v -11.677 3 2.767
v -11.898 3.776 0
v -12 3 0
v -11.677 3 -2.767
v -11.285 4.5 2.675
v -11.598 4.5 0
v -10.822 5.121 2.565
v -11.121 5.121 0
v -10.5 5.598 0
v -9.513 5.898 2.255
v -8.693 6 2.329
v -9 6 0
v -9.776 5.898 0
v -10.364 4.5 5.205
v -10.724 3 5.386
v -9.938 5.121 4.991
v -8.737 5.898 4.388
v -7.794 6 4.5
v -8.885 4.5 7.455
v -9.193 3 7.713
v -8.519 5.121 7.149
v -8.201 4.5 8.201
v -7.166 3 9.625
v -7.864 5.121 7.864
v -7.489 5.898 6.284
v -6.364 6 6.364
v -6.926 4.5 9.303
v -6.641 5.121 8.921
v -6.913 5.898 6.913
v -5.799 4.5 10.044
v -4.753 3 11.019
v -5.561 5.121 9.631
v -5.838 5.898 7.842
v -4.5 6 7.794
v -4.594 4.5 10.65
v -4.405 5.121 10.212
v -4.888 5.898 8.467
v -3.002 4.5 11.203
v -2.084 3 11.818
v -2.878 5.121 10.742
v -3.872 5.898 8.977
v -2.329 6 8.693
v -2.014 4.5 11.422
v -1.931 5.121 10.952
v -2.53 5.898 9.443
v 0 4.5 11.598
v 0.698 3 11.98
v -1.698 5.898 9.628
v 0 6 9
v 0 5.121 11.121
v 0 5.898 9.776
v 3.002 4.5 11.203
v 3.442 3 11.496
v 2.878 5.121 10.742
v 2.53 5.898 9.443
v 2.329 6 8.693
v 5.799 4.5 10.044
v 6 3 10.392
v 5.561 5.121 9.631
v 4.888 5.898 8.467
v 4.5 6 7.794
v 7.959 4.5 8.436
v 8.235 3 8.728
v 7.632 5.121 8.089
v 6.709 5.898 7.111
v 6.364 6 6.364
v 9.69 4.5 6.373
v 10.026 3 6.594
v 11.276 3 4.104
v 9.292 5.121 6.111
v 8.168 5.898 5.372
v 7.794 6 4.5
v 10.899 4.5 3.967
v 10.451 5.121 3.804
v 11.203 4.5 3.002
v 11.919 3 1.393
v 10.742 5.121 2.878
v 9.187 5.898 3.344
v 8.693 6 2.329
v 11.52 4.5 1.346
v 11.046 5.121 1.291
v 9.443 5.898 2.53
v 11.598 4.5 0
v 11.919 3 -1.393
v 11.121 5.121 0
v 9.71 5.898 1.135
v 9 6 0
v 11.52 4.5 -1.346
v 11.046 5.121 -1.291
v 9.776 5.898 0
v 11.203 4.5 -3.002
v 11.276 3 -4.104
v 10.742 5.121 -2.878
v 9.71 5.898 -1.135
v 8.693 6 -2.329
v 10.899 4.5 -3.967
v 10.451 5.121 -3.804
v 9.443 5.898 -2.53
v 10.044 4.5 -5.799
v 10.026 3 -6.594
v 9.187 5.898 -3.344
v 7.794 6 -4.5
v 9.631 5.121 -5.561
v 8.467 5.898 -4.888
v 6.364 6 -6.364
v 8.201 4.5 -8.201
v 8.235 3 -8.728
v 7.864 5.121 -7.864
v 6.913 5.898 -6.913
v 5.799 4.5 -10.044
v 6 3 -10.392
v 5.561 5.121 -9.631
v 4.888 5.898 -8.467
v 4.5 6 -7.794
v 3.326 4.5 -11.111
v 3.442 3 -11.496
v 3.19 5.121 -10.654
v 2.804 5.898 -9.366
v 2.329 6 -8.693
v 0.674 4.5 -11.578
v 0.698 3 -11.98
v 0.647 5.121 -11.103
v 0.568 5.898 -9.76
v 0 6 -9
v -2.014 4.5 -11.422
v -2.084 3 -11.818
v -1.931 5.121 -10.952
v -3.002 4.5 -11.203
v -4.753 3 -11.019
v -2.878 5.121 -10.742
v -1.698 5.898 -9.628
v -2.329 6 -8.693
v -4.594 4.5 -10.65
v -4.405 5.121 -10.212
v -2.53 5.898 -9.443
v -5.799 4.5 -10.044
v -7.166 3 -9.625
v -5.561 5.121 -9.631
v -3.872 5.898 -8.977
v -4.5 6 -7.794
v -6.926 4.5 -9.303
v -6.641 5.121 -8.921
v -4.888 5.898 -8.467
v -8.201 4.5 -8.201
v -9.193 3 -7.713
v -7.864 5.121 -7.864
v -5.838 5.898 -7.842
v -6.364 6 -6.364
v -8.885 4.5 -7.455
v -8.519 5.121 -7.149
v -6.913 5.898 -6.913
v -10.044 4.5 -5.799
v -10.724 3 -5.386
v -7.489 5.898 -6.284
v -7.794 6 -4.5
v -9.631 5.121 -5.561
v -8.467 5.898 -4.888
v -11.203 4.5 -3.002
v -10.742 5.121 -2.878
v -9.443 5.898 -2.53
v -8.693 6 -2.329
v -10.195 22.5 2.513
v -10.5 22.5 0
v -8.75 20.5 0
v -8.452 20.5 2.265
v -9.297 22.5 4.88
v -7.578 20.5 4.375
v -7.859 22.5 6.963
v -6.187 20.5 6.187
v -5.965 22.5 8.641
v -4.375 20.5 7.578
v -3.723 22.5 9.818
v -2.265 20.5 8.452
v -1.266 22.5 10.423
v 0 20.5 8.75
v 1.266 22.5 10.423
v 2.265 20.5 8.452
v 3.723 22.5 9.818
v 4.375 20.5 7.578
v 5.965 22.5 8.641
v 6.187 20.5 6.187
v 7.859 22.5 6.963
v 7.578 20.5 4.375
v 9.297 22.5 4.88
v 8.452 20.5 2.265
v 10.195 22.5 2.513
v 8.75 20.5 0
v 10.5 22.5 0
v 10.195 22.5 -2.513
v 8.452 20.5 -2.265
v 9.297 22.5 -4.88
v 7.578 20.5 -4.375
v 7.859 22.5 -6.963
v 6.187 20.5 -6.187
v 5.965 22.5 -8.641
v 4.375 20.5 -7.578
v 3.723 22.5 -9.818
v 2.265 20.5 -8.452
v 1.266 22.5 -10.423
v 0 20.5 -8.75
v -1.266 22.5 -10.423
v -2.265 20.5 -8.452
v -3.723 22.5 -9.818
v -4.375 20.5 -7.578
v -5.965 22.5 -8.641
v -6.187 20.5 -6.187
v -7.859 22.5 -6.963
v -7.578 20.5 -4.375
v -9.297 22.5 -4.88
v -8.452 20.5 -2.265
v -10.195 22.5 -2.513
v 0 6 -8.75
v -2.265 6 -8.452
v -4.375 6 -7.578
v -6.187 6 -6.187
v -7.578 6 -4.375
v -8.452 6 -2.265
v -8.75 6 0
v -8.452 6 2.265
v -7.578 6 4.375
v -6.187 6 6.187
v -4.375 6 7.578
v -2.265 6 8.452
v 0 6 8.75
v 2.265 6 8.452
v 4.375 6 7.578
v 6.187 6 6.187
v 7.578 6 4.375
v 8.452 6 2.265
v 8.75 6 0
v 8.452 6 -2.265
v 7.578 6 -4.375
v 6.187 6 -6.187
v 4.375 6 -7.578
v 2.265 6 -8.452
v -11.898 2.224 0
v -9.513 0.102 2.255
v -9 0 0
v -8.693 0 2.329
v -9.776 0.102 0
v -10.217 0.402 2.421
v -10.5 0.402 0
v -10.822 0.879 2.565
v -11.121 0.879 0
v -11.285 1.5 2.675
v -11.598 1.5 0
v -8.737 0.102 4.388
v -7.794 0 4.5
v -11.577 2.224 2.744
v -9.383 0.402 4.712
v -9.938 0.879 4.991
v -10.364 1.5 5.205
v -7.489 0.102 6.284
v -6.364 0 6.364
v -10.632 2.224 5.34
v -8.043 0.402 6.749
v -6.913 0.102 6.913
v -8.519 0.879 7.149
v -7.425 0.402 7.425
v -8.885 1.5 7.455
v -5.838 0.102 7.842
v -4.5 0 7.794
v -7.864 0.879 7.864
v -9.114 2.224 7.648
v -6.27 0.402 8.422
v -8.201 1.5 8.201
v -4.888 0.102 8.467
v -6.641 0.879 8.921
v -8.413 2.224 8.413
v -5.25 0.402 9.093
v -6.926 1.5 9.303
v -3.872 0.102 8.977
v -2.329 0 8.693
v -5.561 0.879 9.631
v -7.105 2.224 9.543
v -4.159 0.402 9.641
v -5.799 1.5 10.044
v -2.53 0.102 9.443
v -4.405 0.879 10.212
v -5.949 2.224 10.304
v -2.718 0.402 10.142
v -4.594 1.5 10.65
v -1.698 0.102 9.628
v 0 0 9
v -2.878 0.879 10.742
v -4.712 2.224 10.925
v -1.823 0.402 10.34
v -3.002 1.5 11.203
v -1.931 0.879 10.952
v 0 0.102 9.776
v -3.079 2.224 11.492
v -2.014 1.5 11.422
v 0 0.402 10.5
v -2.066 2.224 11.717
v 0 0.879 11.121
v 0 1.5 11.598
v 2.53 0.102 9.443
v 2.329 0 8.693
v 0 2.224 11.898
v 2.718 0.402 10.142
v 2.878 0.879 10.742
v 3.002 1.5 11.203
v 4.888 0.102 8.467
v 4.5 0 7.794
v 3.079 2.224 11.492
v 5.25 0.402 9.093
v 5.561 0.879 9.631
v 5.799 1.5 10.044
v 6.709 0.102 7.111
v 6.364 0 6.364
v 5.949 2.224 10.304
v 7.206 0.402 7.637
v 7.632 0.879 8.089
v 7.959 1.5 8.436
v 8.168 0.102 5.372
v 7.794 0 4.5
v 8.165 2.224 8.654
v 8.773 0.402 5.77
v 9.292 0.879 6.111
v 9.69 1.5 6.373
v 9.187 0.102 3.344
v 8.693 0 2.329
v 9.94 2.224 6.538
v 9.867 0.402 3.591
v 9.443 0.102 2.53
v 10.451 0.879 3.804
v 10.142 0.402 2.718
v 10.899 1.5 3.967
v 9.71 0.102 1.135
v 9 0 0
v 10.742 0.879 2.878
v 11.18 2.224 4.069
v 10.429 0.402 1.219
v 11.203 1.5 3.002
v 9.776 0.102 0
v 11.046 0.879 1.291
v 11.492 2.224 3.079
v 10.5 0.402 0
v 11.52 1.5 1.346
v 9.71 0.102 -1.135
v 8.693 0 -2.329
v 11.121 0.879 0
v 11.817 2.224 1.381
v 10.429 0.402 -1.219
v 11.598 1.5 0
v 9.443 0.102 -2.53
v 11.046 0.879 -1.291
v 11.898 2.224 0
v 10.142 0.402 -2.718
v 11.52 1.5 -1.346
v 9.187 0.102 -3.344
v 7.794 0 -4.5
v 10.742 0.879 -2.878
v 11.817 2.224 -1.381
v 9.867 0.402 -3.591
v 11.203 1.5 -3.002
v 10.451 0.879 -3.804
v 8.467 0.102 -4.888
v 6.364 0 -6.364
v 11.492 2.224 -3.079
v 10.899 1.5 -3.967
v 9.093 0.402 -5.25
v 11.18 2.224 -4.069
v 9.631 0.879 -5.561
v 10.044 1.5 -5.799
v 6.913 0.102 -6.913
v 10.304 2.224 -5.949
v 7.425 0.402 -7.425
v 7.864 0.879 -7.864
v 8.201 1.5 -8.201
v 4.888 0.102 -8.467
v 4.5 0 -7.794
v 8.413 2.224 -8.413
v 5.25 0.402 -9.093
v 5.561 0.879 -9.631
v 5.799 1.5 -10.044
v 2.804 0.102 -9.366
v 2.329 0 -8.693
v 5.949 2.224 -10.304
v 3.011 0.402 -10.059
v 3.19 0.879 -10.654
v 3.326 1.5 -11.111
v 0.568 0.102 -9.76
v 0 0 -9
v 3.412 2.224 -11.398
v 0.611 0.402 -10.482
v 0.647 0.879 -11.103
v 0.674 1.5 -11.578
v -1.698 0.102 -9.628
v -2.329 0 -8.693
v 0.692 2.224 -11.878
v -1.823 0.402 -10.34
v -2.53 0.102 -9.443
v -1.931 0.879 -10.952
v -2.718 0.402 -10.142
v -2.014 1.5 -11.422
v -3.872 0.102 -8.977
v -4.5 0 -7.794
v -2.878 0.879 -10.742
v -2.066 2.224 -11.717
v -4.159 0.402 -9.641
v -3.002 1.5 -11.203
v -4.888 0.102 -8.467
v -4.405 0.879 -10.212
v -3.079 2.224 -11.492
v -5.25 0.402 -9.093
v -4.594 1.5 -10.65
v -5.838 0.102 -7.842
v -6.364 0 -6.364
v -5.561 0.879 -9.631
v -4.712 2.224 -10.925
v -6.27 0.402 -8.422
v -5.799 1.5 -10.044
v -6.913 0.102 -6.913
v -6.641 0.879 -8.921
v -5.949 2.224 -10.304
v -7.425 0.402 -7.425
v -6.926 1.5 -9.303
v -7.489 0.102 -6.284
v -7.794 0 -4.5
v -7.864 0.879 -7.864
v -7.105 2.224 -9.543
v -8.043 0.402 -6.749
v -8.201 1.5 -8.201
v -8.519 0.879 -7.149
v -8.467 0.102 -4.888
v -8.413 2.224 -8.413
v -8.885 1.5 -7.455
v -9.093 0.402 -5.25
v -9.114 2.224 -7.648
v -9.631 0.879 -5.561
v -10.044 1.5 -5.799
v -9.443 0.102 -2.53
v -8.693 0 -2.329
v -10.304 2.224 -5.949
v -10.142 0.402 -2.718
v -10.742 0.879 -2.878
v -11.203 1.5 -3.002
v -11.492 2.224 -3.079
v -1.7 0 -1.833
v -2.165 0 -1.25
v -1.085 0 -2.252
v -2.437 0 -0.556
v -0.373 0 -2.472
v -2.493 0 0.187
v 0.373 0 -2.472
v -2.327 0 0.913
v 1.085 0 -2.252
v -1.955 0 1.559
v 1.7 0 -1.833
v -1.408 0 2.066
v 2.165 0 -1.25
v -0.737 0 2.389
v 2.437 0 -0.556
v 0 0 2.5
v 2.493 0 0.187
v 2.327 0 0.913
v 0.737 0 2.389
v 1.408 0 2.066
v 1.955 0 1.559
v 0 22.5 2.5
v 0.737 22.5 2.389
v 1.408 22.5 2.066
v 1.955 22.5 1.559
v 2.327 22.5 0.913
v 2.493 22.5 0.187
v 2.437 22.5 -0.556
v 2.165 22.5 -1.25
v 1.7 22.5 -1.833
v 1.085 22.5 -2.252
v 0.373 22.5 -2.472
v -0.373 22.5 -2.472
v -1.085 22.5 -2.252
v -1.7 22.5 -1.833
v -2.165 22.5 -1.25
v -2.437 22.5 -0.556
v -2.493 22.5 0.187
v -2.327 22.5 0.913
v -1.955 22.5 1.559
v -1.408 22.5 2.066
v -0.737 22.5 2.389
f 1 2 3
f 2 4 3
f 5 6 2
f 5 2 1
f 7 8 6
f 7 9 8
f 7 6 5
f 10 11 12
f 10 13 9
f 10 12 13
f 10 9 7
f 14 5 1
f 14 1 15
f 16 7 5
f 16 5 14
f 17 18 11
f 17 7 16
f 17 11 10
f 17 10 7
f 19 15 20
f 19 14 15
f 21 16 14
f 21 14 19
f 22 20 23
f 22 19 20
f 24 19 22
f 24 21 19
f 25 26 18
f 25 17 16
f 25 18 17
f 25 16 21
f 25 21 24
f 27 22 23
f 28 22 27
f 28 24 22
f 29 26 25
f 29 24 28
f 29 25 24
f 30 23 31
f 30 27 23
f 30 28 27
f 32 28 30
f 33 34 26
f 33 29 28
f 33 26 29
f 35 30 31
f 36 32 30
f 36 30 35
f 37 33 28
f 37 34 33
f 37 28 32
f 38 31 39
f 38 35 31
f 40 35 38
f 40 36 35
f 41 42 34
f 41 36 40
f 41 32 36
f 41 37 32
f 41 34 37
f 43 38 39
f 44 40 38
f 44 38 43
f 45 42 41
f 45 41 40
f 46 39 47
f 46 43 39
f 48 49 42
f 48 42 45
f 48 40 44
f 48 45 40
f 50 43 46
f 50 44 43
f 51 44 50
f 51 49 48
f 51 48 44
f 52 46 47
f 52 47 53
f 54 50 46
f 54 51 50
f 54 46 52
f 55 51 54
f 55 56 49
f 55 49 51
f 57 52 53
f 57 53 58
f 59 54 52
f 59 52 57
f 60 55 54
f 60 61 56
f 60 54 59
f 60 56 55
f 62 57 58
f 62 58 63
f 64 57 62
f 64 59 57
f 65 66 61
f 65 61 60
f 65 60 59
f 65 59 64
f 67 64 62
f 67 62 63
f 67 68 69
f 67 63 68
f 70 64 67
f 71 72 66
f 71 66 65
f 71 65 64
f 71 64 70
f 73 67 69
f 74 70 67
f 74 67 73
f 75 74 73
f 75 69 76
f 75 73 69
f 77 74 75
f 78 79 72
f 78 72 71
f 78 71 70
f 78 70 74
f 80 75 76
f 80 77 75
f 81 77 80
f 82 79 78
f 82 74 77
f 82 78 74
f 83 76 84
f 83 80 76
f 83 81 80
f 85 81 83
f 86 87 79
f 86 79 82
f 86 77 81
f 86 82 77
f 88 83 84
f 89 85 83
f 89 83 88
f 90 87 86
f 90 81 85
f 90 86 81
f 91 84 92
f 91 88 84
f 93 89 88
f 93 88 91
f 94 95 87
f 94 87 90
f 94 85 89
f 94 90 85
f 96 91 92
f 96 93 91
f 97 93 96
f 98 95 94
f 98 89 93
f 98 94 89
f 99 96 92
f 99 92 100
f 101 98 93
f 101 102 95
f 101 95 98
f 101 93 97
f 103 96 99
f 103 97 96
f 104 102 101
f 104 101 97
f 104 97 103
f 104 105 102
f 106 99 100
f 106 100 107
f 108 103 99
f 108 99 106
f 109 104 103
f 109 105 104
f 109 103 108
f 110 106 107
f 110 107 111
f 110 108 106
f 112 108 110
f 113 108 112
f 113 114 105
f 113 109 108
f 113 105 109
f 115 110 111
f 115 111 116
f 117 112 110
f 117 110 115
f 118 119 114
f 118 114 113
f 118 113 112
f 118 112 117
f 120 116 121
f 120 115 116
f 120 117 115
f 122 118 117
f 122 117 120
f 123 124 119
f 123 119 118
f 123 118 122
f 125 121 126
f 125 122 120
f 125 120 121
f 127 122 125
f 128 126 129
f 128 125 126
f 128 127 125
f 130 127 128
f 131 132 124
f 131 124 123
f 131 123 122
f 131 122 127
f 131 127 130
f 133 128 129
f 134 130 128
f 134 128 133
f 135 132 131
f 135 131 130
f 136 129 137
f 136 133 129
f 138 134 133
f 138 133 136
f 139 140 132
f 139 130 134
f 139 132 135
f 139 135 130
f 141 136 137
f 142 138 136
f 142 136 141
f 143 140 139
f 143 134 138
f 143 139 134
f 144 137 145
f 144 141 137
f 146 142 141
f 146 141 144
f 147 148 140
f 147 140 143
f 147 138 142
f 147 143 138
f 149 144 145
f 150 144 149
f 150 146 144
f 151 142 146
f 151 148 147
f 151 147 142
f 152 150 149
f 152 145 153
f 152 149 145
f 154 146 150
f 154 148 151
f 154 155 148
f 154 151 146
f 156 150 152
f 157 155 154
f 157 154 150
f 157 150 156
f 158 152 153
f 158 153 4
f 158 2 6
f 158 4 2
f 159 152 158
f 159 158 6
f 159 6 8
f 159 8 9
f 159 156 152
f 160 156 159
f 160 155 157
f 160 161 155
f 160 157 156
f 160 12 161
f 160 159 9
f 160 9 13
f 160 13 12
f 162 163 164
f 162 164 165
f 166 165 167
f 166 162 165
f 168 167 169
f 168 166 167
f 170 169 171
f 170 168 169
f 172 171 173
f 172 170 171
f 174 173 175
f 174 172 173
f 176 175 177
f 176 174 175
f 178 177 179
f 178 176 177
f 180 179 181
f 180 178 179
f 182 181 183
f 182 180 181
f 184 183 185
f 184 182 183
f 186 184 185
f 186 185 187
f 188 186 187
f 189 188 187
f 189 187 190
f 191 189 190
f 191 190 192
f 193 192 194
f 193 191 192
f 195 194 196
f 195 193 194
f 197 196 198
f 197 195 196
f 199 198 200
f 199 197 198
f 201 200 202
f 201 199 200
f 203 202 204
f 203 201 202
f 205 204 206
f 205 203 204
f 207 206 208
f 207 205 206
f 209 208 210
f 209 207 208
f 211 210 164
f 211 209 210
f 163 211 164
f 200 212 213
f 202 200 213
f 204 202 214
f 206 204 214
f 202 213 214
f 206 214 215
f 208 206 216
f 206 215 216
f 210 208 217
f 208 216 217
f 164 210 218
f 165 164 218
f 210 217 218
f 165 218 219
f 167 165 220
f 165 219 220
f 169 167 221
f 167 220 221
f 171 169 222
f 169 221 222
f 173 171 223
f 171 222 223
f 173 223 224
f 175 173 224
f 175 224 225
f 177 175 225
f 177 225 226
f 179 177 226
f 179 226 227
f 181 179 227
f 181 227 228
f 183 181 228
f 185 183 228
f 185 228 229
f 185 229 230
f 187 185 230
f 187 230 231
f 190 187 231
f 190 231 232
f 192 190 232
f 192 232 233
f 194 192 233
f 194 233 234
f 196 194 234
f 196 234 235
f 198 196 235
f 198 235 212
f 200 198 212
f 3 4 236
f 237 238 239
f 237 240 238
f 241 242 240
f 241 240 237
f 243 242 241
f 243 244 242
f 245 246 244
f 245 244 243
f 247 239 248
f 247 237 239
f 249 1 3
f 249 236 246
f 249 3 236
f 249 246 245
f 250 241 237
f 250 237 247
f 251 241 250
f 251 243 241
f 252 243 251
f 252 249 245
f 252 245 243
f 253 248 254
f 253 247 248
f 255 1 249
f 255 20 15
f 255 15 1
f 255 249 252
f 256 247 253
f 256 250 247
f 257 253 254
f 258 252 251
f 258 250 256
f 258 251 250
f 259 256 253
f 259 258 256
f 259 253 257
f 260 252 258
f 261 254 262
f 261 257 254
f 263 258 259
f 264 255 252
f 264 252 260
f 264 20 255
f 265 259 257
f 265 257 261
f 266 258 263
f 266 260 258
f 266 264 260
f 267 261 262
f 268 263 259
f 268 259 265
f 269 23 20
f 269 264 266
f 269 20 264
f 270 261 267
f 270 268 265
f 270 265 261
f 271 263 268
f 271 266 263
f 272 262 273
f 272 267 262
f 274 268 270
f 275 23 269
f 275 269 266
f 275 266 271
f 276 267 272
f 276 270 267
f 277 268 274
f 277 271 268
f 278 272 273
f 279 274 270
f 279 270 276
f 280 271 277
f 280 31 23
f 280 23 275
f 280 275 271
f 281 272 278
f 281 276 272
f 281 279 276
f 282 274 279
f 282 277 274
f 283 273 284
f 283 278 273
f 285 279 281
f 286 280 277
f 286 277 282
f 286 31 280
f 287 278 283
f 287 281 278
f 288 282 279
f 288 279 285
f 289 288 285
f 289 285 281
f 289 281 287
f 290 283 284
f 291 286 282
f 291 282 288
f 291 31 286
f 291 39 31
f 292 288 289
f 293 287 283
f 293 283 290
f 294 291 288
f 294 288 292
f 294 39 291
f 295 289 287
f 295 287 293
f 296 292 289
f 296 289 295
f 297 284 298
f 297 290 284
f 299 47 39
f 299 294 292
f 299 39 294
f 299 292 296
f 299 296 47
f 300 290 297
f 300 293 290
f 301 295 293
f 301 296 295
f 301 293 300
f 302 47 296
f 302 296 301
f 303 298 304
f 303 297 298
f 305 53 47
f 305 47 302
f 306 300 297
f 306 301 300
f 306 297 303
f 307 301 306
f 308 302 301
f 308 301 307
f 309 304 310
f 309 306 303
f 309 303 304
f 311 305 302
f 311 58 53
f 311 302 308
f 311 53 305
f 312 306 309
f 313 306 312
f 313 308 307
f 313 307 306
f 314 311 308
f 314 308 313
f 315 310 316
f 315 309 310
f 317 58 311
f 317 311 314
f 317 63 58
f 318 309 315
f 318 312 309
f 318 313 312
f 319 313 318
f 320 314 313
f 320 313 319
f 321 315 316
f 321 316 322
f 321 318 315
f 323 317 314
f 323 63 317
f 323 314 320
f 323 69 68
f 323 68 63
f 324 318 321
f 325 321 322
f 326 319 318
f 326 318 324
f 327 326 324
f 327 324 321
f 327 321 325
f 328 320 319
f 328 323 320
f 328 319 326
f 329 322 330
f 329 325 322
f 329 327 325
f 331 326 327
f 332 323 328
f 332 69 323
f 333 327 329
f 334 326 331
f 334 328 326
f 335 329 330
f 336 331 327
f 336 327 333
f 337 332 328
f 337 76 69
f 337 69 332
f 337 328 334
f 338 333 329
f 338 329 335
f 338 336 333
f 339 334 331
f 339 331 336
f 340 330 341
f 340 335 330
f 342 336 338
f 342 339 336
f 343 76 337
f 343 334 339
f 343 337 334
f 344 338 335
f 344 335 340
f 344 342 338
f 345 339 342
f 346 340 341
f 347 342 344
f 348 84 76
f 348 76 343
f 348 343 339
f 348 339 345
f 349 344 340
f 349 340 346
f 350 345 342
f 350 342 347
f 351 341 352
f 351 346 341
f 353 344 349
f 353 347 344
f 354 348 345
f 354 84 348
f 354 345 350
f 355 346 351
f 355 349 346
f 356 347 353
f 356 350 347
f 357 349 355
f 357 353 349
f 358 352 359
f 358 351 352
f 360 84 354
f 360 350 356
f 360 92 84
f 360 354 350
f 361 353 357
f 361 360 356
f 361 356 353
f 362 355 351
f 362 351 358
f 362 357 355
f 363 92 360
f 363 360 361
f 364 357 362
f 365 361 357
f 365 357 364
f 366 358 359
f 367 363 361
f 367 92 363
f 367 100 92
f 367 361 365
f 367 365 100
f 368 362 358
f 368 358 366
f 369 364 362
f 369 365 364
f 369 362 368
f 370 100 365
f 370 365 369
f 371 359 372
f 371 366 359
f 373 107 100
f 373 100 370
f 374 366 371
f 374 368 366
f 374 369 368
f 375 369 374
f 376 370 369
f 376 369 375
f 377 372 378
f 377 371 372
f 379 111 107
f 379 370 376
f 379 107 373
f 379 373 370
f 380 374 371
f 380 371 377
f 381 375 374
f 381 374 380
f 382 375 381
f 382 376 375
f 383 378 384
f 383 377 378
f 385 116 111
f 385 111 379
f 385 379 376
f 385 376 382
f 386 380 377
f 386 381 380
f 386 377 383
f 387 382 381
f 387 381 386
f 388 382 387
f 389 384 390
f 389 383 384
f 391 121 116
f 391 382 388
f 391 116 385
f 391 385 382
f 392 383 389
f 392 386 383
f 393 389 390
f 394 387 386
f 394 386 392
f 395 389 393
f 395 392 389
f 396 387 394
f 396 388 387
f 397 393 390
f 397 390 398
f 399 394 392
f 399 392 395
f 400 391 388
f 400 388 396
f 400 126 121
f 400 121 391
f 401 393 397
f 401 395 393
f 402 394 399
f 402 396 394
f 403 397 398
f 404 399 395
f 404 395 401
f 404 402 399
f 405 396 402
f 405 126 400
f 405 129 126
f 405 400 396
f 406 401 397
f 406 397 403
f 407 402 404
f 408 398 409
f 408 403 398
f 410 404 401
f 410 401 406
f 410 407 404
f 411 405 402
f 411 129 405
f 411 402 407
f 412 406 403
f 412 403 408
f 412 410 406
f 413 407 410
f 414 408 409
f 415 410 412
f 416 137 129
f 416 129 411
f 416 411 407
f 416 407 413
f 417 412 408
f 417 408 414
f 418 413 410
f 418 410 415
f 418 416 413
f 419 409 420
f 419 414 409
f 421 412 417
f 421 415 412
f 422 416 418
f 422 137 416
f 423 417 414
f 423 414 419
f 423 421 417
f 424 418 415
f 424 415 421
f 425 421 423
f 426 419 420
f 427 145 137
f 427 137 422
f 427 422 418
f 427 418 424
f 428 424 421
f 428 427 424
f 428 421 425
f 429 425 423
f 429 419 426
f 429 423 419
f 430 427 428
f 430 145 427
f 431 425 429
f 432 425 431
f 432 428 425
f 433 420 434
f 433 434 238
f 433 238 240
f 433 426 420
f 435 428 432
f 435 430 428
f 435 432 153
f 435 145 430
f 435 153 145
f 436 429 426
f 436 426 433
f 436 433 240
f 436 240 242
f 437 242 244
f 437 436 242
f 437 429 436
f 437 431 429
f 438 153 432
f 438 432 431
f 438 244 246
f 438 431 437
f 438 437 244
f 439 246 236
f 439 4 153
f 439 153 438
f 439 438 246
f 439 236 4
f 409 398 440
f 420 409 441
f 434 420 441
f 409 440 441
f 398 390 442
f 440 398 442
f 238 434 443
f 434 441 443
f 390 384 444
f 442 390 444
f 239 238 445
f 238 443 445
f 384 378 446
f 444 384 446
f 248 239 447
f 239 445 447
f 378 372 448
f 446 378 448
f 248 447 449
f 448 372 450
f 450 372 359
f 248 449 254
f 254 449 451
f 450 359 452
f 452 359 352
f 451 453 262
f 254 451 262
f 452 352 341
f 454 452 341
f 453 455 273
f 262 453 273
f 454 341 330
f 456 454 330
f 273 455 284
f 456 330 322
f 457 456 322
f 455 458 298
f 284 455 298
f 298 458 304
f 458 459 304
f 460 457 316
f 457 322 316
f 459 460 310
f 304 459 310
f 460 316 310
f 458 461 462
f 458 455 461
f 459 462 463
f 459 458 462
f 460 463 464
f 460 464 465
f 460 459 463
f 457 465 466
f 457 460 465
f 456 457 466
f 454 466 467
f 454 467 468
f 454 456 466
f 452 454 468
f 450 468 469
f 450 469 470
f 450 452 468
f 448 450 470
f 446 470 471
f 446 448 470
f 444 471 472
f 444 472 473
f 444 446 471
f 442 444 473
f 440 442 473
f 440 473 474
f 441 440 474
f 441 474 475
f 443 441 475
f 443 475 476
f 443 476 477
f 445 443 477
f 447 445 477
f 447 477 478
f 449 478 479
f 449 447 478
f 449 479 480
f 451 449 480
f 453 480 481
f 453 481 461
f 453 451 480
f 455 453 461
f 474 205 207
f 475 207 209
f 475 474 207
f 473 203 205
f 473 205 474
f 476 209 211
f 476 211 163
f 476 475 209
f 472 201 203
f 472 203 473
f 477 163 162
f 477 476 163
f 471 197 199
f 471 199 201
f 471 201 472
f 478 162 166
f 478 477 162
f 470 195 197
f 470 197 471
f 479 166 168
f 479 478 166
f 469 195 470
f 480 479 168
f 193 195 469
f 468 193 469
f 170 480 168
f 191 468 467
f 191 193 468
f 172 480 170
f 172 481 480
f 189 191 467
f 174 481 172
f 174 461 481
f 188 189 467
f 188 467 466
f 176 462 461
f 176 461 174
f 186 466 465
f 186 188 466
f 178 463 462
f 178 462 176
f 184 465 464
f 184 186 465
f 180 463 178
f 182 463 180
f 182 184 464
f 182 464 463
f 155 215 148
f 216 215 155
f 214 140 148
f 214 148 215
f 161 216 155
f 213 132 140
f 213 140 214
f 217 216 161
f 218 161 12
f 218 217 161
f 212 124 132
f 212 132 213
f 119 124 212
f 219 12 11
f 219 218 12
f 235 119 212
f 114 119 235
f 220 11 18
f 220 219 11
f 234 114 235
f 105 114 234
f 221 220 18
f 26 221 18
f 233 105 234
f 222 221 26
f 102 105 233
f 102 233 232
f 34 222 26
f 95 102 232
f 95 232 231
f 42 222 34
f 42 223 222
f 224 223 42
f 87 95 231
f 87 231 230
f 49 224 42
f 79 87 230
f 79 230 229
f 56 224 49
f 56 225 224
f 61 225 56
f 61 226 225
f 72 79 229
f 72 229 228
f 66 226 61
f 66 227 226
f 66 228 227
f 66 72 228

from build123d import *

# Parameters (mm, degrees)
SKETCH1_R           = 12
SKETCH1_R_2         = 2.5
BOSS_EXTRUDE1_DEPTH = 6
SKETCH2_R           = 8.750000000000002
SKETCH2_R_2         = 2.5
BOSS_EXTRUDE2_DEPTH = 14.5
SKETCH3_R           = 10.5
SKETCH3_R_2         = 2.5
BOSS_EXTRUDE3_DEPTH = 2


with BuildPart() as part:
    # Sketch1 → Boss-Extrude1 (new body)
    with BuildSketch(Plane(origin=(0, 0, 0), x_dir=(1, 0, 0), z_dir=(0, 1, 0))):
        with Locations(Location((0, 0, 0), (0, 0, 270))):
            Circle(SKETCH1_R)
        with Locations(Location((0, 0, 0), (0, 0, 270))):
            Circle(SKETCH1_R_2, mode=Mode.SUBTRACT)
    extrude(amount=BOSS_EXTRUDE1_DEPTH)

    # Sketch2 → Boss-Extrude2 (add)
    with BuildSketch(Plane(origin=(0, 6, 0), x_dir=(1, 0, 0), z_dir=(0, 1, 0))):
        with Locations(Location((0, 0, 0), (0, 0, 90))):
            Circle(SKETCH2_R)
        with Locations(Location((0, 0, 0), (0, 0, 270))):
            Circle(SKETCH2_R_2, mode=Mode.SUBTRACT)
    extrude(amount=BOSS_EXTRUDE2_DEPTH)

    # Sketch3 → Boss-Extrude3 (add)
    with BuildSketch(Plane(origin=(0, 20.5, 0), x_dir=(1, 0, 0), z_dir=(0, 1, 0))):
        with Locations(Location((0, 0, 0), (0, 0, 270))):
            Circle(SKETCH3_R)
        with Locations(Location((0, 0, 0), (0, 0, 270))):
            Circle(SKETCH3_R_2, mode=Mode.SUBTRACT)
    extrude(amount=BOSS_EXTRUDE3_DEPTH)

    # Cut-Sweep3: sweep along a curve in space
    with BuildLine() as cut_sweep3_path:
        ThreePointArc((0, 20.5, 8.750000000000002), (6.187184335382292, 20.5, 6.187184335382293), (8.750000000000002, 20.5, 0))
        ThreePointArc((8.750000000000002, 20.5, 0), (6.187184335382293, 20.5, -6.187184335382292), (0, 20.5, -8.750000000000002))
        ThreePointArc((0, 20.5, -8.750000000000002), (-6.187184335382292, 20.5, -6.187184335382293), (-8.750000000000002, 20.5, 0))
        ThreePointArc((-8.750000000000002, 20.5, 0), (-6.187184335382293, 20.5, 6.187184335382292), (0, 20.5, 8.750000000000002))
    # Sketch5 → Cut-Sweep3 (sweep, cut)
    with BuildSketch(Plane.XY):
        Polygon((-10.5, 22.5), (-8.750000000000002, 20.5), (-10.5, 20.5), align=None)
    sweep(path=cut_sweep3_path.line, mode=Mode.SUBTRACT)

    # Cut-Sweep4: sweep along a curve in space
    with BuildLine() as cut_sweep4_path:
        ThreePointArc((0, 6, 12.000000000000002), (8.485281374238571, 6, 8.485281374238571), (12.000000000000002, 6, 0))
        ThreePointArc((12.000000000000002, 6, 0), (8.485281374238571, 6, -8.485281374238571), (0, 6, -12.000000000000002))
        ThreePointArc((0, 6, -12.000000000000002), (-8.485281374238571, 6, -8.485281374238571), (-12.000000000000002, 6, 0))
        ThreePointArc((-12.000000000000002, 6, 0), (-8.485281374238571, 6, 8.485281374238571), (0, 6, 12.000000000000002))
    # Sketch6 → Cut-Sweep4 (sweep, cut)
    with BuildSketch(Plane.XY):
        with BuildLine():
            Line((-12.000000000000002, 3), (-12.000000000000002, 6))
            Line((-12.000000000000002, 6), (-9.000000000000002, 6.000000000000002))
            ThreePointArc((-9.000000000000002, 6.000000000000002), (-11.121320343559645, 5.121320343559644), (-12.000000000000002, 3))
        make_face()
    sweep(path=cut_sweep4_path.line, mode=Mode.SUBTRACT)

    # Cut-Sweep5: sweep along a curve in space
    with BuildLine() as cut_sweep5_path:
        ThreePointArc((0, 0, 12.000000000000002), (8.485281374238571, 0, 8.485281374238571), (12.000000000000002, 0, 0))
        ThreePointArc((12.000000000000002, 0, 0), (8.485281374238571, 0, -8.485281374238571), (0, 0, -12.000000000000002))
        ThreePointArc((0, 0, -12.000000000000002), (-8.485281374238571, 0, -8.485281374238571), (-12.000000000000002, 0, 0))
        ThreePointArc((-12.000000000000002, 0, 0), (-8.485281374238571, 0, 8.485281374238571), (0, 0, 12.000000000000002))
    # Sketch7 → Cut-Sweep5 (sweep, cut)
    with BuildSketch(Plane.XY):
        with BuildLine():
            Line((-9.000000000000002, -1.3e-15), (-12.000000000000002, 0))
            Line((-12.000000000000002, 0), (-12.000000000000002, 2.999999999999979))
            ThreePointArc((-12.000000000000002, 2.999999999999979), (-11.121320343559637, 0.8786796564403496), (-9.000000000000002, -1.3e-15))
        make_face()
    sweep(path=cut_sweep5_path.line, mode=Mode.SUBTRACT)


solid = part.part
